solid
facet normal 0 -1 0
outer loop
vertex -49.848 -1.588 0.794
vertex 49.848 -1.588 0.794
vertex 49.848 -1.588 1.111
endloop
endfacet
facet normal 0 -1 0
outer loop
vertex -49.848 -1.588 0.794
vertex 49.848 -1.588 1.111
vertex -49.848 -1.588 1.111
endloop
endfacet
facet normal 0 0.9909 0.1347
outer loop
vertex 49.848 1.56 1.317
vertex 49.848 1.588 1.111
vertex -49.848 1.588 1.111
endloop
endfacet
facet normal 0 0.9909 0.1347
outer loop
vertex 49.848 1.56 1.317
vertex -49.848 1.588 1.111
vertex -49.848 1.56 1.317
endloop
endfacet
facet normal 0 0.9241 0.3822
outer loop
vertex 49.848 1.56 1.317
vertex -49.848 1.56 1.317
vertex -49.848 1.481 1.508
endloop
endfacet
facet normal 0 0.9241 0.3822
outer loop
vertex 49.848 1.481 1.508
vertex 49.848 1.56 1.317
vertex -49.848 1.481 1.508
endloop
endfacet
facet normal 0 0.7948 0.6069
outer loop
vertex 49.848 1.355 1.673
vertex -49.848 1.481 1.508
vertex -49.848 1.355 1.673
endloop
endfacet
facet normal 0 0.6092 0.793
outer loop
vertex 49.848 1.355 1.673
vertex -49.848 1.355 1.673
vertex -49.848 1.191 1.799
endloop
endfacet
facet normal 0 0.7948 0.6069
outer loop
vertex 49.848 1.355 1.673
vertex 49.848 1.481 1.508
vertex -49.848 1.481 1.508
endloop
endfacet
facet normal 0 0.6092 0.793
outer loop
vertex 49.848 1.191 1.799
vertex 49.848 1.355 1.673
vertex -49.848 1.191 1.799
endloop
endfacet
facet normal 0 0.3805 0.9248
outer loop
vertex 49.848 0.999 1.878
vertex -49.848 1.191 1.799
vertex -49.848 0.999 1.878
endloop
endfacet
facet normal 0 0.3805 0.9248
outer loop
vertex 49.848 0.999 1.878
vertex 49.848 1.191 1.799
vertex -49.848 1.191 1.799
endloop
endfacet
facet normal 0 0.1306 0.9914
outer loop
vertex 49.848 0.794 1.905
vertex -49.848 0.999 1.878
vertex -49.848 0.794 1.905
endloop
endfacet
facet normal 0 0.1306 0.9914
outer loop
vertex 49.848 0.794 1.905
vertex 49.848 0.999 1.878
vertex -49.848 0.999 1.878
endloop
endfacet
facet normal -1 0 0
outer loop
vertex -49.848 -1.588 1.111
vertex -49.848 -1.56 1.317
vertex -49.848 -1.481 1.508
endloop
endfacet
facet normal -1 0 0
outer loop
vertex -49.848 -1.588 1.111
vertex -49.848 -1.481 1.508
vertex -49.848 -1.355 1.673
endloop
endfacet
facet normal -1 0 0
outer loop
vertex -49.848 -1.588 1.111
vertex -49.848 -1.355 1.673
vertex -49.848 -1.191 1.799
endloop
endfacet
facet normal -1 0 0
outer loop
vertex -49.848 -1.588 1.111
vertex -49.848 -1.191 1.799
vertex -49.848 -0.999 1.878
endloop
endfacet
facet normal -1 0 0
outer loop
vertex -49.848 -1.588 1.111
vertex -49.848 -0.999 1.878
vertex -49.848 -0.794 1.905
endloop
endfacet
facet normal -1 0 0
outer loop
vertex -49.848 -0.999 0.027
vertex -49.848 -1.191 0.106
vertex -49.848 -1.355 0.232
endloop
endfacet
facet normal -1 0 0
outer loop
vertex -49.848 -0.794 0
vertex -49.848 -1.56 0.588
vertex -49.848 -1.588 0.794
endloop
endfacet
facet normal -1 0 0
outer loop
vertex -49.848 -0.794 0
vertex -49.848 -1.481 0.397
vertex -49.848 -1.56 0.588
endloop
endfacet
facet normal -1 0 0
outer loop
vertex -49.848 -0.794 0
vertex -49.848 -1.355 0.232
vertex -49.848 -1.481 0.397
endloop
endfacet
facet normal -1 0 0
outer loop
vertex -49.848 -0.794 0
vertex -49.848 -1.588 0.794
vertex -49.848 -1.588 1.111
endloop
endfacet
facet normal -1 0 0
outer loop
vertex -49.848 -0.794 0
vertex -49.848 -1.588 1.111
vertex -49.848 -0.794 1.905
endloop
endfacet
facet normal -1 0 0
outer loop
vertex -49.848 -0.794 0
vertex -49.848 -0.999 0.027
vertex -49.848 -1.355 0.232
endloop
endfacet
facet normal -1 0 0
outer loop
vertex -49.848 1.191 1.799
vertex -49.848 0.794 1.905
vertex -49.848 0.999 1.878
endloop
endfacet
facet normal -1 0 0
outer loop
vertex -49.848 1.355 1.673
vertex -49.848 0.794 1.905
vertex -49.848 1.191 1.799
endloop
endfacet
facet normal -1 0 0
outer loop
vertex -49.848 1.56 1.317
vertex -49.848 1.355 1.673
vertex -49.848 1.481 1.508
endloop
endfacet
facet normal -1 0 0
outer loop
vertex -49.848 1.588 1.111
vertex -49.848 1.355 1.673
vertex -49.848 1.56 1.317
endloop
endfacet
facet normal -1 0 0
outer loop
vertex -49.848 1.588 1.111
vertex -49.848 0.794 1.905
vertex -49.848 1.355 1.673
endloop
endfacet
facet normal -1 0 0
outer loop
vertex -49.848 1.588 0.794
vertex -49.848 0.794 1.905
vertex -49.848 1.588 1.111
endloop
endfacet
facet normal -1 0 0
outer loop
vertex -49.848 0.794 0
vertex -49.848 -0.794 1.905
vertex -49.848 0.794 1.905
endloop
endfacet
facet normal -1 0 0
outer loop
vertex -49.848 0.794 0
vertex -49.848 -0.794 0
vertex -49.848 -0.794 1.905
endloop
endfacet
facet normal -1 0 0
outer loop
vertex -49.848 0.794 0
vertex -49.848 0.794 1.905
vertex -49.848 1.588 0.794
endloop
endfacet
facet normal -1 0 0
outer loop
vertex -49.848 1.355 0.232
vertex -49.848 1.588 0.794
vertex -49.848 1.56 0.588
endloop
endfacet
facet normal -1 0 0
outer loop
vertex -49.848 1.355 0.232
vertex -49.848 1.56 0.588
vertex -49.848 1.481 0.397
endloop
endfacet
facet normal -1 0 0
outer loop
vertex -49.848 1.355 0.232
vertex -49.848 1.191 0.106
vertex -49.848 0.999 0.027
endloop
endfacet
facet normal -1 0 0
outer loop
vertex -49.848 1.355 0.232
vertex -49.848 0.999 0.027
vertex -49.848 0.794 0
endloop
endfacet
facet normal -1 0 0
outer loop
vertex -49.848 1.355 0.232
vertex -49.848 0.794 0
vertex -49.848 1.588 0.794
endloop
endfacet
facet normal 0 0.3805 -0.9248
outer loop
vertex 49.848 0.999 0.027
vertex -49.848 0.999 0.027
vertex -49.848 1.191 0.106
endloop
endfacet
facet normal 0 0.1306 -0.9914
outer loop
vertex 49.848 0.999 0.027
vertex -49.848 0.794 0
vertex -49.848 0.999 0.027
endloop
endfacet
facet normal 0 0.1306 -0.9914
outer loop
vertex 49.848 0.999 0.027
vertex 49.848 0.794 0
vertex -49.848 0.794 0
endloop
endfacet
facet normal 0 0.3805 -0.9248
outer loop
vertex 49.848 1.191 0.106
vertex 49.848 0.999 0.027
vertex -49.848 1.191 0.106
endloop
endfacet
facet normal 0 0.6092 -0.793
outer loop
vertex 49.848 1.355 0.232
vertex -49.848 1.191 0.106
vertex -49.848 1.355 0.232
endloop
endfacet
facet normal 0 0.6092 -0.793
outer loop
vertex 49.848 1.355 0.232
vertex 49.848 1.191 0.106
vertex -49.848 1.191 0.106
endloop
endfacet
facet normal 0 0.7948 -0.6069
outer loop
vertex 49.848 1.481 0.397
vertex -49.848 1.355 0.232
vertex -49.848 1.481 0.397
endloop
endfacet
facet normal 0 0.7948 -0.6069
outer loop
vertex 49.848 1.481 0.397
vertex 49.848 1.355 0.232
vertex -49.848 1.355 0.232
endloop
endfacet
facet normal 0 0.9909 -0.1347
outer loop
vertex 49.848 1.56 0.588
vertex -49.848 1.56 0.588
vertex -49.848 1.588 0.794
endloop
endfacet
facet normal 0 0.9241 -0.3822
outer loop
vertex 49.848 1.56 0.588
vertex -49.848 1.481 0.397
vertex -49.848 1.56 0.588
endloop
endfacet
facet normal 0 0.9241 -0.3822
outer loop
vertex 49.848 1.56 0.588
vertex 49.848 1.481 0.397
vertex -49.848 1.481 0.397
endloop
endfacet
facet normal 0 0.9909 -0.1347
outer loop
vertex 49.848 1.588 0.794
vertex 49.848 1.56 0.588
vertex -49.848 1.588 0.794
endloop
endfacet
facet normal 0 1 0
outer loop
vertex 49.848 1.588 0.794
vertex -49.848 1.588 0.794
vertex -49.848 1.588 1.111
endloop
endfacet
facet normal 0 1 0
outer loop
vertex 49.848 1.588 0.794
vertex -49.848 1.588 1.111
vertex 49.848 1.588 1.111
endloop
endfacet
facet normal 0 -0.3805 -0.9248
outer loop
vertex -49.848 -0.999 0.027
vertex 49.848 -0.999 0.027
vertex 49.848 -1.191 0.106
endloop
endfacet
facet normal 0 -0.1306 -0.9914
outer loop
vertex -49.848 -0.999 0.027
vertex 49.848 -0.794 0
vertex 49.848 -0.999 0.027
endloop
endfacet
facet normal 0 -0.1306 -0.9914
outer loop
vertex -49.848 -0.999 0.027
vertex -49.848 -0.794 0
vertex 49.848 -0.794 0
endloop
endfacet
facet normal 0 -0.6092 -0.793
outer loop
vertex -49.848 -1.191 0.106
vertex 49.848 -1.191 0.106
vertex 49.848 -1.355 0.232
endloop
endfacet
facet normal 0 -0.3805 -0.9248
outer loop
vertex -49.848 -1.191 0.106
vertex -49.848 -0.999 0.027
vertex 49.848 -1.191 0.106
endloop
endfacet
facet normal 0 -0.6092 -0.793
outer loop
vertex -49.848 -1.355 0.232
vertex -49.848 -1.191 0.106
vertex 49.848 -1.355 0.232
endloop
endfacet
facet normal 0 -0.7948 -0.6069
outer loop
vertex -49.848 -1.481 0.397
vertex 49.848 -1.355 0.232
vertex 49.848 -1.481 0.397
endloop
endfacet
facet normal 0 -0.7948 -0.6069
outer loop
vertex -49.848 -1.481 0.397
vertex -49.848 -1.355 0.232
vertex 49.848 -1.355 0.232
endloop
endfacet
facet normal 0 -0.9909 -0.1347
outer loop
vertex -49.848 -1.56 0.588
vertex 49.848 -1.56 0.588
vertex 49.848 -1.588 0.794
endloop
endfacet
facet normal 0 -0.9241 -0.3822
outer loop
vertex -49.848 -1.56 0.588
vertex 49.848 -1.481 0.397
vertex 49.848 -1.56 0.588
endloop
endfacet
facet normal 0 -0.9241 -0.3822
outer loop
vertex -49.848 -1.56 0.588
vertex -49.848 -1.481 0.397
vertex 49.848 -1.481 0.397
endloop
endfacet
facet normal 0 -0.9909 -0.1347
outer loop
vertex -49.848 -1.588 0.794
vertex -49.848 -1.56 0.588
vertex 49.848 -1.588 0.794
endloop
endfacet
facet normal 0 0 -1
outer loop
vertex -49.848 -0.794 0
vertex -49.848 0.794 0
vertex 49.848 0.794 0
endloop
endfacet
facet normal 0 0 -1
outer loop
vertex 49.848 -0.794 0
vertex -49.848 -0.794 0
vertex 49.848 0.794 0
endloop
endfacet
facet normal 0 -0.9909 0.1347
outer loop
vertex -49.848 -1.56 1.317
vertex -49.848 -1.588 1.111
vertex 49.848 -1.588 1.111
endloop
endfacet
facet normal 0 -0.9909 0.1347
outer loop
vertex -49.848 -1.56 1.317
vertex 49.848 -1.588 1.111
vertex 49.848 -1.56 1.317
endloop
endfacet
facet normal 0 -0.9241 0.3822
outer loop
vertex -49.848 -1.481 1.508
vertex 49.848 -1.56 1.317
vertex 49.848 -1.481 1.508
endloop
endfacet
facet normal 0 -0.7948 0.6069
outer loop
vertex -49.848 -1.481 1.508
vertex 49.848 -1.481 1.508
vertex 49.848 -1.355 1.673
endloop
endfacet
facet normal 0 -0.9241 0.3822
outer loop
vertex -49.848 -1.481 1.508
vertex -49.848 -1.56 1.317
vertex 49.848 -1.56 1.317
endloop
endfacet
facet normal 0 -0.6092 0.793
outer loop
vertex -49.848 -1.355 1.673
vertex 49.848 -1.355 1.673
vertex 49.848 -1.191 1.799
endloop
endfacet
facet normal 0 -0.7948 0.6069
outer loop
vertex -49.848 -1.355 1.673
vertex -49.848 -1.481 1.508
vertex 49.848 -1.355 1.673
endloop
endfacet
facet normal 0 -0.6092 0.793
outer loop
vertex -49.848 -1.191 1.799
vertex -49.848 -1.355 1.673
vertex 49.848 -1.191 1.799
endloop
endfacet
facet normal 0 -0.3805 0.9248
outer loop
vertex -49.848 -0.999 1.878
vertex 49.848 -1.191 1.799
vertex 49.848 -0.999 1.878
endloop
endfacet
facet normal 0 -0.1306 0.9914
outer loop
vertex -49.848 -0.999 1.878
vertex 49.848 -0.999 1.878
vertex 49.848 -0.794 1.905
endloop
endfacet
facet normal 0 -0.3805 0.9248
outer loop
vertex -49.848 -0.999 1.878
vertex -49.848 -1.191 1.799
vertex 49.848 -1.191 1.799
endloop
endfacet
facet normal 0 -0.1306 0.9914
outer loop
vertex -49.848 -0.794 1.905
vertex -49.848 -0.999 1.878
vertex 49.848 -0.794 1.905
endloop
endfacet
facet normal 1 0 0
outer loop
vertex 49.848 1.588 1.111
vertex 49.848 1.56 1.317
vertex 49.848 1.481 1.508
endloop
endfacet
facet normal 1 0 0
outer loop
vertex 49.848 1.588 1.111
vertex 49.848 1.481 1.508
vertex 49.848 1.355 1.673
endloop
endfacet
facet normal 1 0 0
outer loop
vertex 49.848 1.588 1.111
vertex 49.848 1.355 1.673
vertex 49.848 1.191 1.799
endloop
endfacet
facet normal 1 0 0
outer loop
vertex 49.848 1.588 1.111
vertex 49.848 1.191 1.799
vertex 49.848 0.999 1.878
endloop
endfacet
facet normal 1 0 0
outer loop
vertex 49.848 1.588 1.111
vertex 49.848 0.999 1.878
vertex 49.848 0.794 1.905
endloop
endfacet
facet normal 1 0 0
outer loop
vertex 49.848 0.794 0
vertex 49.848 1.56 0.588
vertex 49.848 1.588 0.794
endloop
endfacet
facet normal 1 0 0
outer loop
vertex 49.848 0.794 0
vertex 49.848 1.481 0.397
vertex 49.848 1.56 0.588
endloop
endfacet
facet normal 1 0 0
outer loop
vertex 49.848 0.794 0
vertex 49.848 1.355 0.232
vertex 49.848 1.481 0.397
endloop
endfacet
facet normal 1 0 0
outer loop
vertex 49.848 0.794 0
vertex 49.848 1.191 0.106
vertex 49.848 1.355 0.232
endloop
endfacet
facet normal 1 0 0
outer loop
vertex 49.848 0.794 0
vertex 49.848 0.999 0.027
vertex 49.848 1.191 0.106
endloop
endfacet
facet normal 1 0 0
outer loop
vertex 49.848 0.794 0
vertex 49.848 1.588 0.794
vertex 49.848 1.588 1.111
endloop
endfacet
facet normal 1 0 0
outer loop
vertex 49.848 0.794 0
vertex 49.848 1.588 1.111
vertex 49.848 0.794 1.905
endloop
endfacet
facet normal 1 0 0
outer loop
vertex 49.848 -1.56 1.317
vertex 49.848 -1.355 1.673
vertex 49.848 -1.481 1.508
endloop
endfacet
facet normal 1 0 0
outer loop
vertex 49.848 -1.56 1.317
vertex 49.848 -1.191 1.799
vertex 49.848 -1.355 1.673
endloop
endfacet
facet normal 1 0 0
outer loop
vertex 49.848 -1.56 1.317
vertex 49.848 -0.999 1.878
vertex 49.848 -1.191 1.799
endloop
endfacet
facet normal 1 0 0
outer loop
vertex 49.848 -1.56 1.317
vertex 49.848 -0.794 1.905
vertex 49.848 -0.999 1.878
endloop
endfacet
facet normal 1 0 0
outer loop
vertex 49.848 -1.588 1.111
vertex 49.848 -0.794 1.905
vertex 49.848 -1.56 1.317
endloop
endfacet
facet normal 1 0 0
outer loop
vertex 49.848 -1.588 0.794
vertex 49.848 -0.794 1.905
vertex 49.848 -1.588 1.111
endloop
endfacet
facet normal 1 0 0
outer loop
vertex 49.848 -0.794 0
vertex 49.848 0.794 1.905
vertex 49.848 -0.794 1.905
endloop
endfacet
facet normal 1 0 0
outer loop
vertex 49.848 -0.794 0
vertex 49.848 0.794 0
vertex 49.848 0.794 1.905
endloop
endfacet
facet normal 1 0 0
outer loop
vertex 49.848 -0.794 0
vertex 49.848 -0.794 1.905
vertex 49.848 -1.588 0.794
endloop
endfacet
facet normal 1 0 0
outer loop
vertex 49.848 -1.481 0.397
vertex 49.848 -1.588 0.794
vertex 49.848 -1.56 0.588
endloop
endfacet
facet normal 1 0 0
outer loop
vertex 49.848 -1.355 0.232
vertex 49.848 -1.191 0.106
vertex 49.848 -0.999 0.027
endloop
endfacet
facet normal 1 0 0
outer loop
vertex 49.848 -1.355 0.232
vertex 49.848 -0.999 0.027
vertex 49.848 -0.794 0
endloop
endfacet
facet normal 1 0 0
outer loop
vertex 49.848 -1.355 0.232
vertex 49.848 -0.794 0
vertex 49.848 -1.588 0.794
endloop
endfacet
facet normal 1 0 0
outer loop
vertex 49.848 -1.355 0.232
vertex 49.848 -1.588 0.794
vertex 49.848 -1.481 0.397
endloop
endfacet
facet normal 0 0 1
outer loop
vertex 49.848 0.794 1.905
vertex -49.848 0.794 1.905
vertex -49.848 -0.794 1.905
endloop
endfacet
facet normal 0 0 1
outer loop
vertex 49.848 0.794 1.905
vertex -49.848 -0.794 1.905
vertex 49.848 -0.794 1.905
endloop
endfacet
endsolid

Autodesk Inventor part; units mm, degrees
ref_plane "YZ Plane" through (0, 0, 0) normal (1, 0, 0) x (0, 1, 0)
ref_plane "XZ Plane" through (0, 0, 0) normal (0, 1, 0) x (-1, 0, 0)
ref_plane "XY Plane" through (0, 0, 0) normal (0, 0, 1) x (1, 0, 0)
sketch "Sketch1" plane through (0, 0, 0) normal (0, 0, 1) x (1, 0, 0)
  line L0 (49.8475, -1.5875) -> (-49.8475, -1.5875)
  line L1 (-49.8475, -1.5875) -> (-49.8475, 1.5875)
  line L2 (-49.8475, 1.5875) -> (49.8475, 1.5875)
  line L3 (49.8475, 1.5875) -> (49.8475, -1.5875)
  line L4 (49.8475, -1.5875) -> (-49.8475, 1.5875) construction
  line L5 (-49.8475, -1.5875) -> (49.8475, 1.5875) construction
  point P0 (0, 0)
  dimension "d0" = 99.695
  dimension "d1" = 3.175
extrude "Extrusion1" add sketch "Sketch1" along normal blind 1.905
fillet "Fillet1" radius 0.7937 4 edges at (0, 1.5875, 1.905) (0, -1.5875, 1.905) (0, 1.5875, 0) (0, -1.5875, 0)
equation "\"d1\" = oRingWidth"
equation "\"d4\" = 0.25 * oRingWidth"
equation "\"acrylicThickness\" = 6.35"
equation "\"height\" = 101.6"
equation "\"width\" = 101.6"
equation "\"depth\" = 101.6"
equation "\"mirrorAngle\" = 5deg"
equation "\"detectorWidth\" = 52"
equation "\"detectorHeight\" = 52"
equation "\"mirrorThickness\" = 3"
equation "\"fresnelThickness\" = 0.1"
equation "\"focalLength\" = 76.2"
equation "\"ior\" = 1.49"
equation "\"centerThickness\" = 1.524"
equation "\"fresnelAngle\" = 90deg"
equation "\"fresnelEffectiveDiameter\" = 76.2"
equation "\"mirrorSuppourtWidth\" = 38.1"
equation "\"backGrooveBit\" = 4.8006"
equation "\"sensorHolderWidth\" = 88.9"
equation "\"sensorHolderHeight\" = 88.9"
equation "\"sensorHolderSensorHeight\" = 53.975"
equation "\"sensorHolderSensorWidth\" = 53.975"
equation "\"oRingWidth\" = 3.175"
equation "\"sensorHolderORingID\" = 203.2"
equation "\"sensorHolderFlushORingID\" = 304.8"
equation "\"frontBackORingID\" = 419.1"
equation "\"mirrorGroove\" = 19.05"
equation "\"backMirrorGroove\" = 6.35"
equation "\"mirrorGrooveFillet\" = 6.35"
equation "\"fresnelChamfer\" = 6.35"
equation "\"mirrorGrooveDrill\" = 6.35"
equation "\"mirrorGrooveMill\" = 3.175"
equation "\"fresnelMirrorChamfer\" = 6.35"
equation "\"detectorOpeningWidth\" = 76.2"
equation "\"detectorOpeningHeight\" = 76.2"
properties part number "topBottomORing" material "Rubber"
